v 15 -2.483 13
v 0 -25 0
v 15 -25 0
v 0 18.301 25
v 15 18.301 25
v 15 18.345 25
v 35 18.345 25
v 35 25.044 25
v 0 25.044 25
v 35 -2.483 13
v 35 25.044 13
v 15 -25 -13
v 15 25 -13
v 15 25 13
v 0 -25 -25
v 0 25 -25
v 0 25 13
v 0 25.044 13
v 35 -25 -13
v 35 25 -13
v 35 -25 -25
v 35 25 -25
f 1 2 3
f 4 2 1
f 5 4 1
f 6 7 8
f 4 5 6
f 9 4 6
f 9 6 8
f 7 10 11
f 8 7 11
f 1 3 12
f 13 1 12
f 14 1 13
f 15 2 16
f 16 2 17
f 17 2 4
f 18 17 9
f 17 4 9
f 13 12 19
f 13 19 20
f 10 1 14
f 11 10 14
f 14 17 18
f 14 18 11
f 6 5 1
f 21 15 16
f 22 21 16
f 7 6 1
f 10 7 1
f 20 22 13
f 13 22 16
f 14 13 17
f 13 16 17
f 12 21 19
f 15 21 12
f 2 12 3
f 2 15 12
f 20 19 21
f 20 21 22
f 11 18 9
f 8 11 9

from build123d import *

# Parameters (mm, degrees)
F0_W     = 50
F0_H     = 50
F1_DEPTH = 15
F2_SIZE2 = 43.30127
F2_SIZE  = 25
F4_DEPTH = 35
F5_W     = 50
F5_H     = 12
F6_DEPTH = 35


with BuildPart() as f1:
    # F0 (on Right) → F1 (new body)
    with BuildSketch(Plane.YZ):
        Rectangle(F0_W, F0_H)
    extrude(amount=F1_DEPTH)

    # F2
    f2_edges = [f1.edges().sort_by_distance(p)[0] for p in [
        (7.5, -25, 25),
    ]]
    chamfer(f2_edges, length=F2_SIZE, length2=F2_SIZE2)

    # F3 (on Right) → F4 (join)
    with BuildSketch(Plane.YZ):
        Polygon((-2.48334, 13), (25.0436, 13), (25.0436, 25), (18.3446, 25), align=None)
    extrude(amount=F4_DEPTH)

    # F5 (on Right) → F6 (join)
    with BuildSketch(Plane.YZ):
        with Locations((0, -19)):
            Rectangle(F5_W, F5_H)
    extrude(amount=F6_DEPTH)


solid = f1.part
